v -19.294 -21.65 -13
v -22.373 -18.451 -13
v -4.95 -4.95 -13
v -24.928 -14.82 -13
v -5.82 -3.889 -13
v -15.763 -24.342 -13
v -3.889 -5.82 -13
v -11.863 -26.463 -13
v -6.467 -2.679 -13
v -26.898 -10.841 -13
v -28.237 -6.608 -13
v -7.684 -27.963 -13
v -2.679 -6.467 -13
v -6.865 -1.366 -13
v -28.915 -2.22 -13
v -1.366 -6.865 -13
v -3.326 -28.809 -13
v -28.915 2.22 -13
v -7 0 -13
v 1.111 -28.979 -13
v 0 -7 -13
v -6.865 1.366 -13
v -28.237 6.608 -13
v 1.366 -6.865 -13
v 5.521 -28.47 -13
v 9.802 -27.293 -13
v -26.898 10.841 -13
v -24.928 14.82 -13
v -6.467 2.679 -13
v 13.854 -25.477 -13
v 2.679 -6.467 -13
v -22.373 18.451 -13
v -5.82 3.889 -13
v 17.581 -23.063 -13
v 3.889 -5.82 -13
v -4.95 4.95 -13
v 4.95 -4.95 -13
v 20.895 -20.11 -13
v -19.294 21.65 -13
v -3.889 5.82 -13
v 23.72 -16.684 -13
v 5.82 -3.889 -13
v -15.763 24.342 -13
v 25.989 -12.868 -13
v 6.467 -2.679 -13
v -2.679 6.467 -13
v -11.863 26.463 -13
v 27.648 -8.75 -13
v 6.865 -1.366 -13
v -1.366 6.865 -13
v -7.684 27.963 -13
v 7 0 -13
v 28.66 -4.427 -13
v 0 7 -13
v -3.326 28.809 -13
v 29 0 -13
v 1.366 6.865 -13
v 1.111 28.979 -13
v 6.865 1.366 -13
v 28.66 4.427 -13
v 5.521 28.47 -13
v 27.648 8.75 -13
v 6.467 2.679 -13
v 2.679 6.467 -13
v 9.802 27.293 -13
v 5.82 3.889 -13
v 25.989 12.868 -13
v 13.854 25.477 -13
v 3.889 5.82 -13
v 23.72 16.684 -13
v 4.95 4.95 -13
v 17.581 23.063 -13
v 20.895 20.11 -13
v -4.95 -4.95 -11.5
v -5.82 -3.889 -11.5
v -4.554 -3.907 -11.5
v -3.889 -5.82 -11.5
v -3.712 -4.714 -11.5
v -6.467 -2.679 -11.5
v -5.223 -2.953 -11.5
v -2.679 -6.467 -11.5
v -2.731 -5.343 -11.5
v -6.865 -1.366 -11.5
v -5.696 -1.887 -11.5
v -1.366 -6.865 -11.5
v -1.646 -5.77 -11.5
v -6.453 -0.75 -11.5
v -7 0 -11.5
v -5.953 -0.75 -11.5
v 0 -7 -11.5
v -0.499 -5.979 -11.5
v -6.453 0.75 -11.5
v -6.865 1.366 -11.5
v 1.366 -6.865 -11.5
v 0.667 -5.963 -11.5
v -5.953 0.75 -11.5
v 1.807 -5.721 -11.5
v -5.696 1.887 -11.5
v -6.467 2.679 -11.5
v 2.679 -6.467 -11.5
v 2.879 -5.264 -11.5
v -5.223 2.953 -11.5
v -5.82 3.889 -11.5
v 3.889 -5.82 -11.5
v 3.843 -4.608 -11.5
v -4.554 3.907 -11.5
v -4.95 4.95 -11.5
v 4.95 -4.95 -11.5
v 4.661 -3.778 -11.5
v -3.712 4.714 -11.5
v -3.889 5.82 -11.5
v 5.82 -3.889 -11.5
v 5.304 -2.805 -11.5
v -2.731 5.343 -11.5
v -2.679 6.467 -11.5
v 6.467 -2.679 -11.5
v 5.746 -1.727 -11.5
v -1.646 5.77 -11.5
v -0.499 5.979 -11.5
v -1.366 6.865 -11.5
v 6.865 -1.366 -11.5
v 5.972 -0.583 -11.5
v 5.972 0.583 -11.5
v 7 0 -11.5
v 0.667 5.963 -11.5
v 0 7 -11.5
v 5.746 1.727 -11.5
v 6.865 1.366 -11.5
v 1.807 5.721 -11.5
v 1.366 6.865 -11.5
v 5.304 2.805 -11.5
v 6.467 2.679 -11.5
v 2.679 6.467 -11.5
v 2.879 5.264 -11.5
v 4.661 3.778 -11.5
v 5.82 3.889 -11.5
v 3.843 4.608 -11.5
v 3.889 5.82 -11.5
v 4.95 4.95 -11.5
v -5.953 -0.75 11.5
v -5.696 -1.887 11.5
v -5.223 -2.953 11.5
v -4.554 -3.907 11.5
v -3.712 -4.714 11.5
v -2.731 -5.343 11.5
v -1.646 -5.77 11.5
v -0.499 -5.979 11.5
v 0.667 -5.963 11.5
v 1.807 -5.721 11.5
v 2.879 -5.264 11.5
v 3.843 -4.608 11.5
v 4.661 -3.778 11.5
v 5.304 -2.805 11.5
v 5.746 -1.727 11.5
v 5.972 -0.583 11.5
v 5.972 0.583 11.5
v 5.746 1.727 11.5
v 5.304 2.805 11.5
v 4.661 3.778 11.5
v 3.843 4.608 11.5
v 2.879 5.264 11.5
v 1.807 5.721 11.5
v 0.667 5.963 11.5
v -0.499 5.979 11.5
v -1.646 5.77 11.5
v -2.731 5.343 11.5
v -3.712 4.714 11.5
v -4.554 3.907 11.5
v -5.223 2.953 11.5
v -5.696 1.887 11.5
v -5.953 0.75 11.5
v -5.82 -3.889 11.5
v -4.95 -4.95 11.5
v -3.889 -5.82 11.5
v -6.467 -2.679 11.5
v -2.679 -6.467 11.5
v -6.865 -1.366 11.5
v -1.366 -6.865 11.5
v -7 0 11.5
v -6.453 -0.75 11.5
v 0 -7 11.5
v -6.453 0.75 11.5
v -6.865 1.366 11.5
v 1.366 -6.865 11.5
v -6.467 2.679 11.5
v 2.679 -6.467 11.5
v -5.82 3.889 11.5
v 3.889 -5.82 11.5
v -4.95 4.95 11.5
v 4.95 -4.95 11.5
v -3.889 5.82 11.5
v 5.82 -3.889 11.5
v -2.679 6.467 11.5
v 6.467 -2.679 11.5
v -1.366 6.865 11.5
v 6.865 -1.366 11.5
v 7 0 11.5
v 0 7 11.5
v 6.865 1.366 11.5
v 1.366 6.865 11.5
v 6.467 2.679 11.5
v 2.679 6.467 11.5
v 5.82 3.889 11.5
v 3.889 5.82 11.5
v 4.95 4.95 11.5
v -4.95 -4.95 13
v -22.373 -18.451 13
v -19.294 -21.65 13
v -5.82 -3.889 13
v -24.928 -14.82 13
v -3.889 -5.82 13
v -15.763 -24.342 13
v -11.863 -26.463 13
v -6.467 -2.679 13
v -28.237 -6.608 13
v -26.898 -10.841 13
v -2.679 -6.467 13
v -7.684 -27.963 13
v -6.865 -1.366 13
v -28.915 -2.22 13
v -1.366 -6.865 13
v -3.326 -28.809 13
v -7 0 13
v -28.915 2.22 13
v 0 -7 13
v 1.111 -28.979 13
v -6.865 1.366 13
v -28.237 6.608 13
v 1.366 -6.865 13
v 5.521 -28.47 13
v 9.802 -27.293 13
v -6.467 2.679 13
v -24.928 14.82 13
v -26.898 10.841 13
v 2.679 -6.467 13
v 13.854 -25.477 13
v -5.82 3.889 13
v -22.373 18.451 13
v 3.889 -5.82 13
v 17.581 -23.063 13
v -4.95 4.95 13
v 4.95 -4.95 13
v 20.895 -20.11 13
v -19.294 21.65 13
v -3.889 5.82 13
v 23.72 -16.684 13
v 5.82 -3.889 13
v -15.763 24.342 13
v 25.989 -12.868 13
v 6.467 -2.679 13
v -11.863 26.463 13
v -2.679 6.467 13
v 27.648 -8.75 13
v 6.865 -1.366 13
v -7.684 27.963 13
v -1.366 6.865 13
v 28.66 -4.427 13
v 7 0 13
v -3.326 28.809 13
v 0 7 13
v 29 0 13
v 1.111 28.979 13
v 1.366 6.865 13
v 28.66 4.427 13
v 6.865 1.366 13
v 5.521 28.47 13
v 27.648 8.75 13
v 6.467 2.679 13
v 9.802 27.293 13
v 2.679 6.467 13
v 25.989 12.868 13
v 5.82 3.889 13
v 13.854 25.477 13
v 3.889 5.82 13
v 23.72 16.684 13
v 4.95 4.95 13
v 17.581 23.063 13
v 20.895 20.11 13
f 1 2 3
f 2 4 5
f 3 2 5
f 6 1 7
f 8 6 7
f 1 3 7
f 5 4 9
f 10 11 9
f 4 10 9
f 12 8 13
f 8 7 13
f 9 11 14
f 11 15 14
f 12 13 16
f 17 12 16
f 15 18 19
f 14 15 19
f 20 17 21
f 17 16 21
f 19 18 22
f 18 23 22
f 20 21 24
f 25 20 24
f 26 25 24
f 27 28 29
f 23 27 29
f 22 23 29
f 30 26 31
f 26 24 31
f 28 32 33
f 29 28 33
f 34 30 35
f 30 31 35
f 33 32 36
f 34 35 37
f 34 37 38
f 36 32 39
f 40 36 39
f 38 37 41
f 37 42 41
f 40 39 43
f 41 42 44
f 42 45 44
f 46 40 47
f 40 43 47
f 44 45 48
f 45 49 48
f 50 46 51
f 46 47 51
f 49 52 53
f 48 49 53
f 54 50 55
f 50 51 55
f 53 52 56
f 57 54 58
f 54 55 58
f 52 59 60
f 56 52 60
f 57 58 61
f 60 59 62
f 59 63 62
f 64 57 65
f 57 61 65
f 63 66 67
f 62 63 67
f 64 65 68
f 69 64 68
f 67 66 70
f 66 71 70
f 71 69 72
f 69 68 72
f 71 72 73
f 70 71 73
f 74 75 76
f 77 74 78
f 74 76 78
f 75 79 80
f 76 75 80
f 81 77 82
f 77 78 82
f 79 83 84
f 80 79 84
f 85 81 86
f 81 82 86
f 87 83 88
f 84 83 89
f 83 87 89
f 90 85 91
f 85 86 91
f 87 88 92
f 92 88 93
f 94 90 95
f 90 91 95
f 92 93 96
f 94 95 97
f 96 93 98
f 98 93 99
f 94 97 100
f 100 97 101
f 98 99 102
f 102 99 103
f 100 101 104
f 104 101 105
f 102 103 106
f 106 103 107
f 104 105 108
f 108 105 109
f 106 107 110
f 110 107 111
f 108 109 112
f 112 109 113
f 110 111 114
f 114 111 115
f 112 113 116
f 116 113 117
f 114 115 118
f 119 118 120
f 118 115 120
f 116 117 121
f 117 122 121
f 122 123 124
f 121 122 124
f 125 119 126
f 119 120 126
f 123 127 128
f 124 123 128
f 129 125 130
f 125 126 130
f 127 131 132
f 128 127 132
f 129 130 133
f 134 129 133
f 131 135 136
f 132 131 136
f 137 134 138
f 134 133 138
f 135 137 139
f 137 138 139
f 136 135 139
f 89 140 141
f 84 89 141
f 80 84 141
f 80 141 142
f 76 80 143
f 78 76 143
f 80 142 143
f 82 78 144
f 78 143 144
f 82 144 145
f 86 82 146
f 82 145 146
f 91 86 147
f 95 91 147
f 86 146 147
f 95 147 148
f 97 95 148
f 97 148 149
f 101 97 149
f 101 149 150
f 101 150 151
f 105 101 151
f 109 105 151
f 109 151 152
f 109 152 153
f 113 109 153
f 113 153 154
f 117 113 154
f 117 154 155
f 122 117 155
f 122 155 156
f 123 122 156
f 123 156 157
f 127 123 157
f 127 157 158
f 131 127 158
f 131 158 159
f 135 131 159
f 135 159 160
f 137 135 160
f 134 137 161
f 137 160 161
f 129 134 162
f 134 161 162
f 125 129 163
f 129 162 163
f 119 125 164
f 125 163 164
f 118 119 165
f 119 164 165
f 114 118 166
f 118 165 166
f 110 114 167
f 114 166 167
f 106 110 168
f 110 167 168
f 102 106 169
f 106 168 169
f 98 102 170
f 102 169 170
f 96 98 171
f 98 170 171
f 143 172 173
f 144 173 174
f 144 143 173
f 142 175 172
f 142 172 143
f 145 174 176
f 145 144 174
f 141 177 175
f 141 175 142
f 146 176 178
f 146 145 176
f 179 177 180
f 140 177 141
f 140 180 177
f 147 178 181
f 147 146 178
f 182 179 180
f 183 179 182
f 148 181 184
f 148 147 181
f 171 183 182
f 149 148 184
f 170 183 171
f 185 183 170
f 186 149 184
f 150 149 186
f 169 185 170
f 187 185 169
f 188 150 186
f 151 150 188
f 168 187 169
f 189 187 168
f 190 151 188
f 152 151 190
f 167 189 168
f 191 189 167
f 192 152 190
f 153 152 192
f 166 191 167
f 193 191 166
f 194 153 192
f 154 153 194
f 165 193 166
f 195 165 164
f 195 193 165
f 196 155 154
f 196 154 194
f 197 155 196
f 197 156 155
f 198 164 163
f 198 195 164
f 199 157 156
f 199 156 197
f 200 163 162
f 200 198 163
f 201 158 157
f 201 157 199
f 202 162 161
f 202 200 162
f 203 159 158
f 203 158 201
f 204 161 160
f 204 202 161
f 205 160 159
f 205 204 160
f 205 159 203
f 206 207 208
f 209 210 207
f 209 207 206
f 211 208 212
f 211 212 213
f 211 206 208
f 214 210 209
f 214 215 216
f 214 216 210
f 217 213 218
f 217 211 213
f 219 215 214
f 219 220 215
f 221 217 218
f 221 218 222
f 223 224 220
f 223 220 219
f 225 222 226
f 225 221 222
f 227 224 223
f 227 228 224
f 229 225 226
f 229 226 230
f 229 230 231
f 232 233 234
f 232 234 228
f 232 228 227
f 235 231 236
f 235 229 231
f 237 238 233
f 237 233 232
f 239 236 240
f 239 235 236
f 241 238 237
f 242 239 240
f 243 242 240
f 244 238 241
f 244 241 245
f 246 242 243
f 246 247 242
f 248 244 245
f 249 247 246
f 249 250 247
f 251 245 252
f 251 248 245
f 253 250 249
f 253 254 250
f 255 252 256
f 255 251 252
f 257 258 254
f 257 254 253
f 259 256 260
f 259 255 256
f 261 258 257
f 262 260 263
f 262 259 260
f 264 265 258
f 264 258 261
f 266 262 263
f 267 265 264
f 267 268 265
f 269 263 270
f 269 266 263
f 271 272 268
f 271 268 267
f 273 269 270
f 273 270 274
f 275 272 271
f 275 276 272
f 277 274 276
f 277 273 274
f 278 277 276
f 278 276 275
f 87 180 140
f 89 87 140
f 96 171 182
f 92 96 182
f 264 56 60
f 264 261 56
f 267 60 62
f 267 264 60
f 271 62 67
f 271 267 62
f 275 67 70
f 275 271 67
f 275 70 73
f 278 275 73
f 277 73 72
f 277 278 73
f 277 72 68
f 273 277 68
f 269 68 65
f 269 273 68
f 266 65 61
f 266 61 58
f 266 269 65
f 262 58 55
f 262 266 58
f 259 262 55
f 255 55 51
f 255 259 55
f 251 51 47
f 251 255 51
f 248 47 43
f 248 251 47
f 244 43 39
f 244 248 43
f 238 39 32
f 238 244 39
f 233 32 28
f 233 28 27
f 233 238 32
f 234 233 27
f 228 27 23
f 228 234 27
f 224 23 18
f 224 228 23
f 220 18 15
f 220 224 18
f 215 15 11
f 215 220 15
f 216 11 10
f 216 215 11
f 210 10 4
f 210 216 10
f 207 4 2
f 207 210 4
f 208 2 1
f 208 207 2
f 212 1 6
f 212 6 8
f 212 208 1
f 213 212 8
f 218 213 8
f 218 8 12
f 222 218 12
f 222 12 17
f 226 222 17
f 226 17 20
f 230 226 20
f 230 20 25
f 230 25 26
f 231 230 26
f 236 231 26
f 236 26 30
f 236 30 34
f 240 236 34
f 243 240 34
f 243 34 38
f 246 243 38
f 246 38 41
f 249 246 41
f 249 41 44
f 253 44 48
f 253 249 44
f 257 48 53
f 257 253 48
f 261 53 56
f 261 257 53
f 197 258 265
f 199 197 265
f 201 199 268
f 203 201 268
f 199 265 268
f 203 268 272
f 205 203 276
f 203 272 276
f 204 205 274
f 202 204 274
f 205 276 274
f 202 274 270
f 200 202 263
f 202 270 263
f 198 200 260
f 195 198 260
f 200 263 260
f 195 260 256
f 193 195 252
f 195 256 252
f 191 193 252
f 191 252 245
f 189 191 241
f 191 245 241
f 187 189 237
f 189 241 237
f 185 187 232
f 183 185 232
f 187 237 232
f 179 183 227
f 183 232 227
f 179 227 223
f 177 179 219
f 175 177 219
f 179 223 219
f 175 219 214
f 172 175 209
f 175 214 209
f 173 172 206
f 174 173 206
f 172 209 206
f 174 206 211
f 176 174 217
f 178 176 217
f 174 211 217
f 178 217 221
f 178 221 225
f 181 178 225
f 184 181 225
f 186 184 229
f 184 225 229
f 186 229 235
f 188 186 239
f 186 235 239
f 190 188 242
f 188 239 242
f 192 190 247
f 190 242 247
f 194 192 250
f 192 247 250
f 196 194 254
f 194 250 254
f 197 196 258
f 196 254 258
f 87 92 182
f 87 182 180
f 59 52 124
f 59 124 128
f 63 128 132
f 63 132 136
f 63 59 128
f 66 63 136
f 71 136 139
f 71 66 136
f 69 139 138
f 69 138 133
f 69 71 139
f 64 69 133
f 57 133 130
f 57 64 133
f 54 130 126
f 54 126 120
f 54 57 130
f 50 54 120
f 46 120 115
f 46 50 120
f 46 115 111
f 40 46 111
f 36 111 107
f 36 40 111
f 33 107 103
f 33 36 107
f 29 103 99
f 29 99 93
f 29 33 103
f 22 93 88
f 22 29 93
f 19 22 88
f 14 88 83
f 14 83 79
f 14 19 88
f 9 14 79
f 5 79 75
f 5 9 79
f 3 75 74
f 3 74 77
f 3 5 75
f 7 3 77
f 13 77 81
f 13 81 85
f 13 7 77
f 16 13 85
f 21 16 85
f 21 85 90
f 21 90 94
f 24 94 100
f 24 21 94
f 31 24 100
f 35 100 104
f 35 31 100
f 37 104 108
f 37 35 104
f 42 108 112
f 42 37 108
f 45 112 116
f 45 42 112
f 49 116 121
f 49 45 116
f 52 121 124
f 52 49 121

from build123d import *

# Parameters (mm, degrees)
BOSS_EXTRUDE1_DEPTH      = 13
BOSS_EXTRUDE1_DEPTH_BACK = 13
SKETCH1_R                = 29
SKETCH2_R                = 7
CUT_EXTRUDE1_DEPTH       = 1.5


with BuildPart() as part:
    # Sketch1 → Boss-Extrude1 (new, two sides: drawn at the far end of the back side and taken through both)
    with BuildSketch(Plane.XY.offset(-BOSS_EXTRUDE1_DEPTH_BACK)):
        Circle(SKETCH1_R)
        with BuildLine():
            Line((-5.95294045, 0.75), (-6.45294045, 0.75))
            Line((-6.45294045, 0.75), (-6.45294045, -0.75))
            Line((-6.45294045, -0.75), (-5.95294045, -0.75))
            ThreePointArc((-5.95294045, -0.75), (6, 0), (-5.95294045, 0.75))
        make_face(mode=Mode.SUBTRACT)
    extrude(amount=BOSS_EXTRUDE1_DEPTH + BOSS_EXTRUDE1_DEPTH_BACK)

    # Sketch2 → Cut-Extrude1 (cut)
    with BuildSketch(Plane.XY.offset(13)):
        Circle(SKETCH2_R)
    cut_extrude1 = extrude(amount=-CUT_EXTRUDE1_DEPTH, mode=Mode.SUBTRACT)

    # Mirror1: Cut-Extrude1 across plane
    add(cut_extrude1.mirror(Plane.XY), mode=Mode.SUBTRACT)


solid = part.part
